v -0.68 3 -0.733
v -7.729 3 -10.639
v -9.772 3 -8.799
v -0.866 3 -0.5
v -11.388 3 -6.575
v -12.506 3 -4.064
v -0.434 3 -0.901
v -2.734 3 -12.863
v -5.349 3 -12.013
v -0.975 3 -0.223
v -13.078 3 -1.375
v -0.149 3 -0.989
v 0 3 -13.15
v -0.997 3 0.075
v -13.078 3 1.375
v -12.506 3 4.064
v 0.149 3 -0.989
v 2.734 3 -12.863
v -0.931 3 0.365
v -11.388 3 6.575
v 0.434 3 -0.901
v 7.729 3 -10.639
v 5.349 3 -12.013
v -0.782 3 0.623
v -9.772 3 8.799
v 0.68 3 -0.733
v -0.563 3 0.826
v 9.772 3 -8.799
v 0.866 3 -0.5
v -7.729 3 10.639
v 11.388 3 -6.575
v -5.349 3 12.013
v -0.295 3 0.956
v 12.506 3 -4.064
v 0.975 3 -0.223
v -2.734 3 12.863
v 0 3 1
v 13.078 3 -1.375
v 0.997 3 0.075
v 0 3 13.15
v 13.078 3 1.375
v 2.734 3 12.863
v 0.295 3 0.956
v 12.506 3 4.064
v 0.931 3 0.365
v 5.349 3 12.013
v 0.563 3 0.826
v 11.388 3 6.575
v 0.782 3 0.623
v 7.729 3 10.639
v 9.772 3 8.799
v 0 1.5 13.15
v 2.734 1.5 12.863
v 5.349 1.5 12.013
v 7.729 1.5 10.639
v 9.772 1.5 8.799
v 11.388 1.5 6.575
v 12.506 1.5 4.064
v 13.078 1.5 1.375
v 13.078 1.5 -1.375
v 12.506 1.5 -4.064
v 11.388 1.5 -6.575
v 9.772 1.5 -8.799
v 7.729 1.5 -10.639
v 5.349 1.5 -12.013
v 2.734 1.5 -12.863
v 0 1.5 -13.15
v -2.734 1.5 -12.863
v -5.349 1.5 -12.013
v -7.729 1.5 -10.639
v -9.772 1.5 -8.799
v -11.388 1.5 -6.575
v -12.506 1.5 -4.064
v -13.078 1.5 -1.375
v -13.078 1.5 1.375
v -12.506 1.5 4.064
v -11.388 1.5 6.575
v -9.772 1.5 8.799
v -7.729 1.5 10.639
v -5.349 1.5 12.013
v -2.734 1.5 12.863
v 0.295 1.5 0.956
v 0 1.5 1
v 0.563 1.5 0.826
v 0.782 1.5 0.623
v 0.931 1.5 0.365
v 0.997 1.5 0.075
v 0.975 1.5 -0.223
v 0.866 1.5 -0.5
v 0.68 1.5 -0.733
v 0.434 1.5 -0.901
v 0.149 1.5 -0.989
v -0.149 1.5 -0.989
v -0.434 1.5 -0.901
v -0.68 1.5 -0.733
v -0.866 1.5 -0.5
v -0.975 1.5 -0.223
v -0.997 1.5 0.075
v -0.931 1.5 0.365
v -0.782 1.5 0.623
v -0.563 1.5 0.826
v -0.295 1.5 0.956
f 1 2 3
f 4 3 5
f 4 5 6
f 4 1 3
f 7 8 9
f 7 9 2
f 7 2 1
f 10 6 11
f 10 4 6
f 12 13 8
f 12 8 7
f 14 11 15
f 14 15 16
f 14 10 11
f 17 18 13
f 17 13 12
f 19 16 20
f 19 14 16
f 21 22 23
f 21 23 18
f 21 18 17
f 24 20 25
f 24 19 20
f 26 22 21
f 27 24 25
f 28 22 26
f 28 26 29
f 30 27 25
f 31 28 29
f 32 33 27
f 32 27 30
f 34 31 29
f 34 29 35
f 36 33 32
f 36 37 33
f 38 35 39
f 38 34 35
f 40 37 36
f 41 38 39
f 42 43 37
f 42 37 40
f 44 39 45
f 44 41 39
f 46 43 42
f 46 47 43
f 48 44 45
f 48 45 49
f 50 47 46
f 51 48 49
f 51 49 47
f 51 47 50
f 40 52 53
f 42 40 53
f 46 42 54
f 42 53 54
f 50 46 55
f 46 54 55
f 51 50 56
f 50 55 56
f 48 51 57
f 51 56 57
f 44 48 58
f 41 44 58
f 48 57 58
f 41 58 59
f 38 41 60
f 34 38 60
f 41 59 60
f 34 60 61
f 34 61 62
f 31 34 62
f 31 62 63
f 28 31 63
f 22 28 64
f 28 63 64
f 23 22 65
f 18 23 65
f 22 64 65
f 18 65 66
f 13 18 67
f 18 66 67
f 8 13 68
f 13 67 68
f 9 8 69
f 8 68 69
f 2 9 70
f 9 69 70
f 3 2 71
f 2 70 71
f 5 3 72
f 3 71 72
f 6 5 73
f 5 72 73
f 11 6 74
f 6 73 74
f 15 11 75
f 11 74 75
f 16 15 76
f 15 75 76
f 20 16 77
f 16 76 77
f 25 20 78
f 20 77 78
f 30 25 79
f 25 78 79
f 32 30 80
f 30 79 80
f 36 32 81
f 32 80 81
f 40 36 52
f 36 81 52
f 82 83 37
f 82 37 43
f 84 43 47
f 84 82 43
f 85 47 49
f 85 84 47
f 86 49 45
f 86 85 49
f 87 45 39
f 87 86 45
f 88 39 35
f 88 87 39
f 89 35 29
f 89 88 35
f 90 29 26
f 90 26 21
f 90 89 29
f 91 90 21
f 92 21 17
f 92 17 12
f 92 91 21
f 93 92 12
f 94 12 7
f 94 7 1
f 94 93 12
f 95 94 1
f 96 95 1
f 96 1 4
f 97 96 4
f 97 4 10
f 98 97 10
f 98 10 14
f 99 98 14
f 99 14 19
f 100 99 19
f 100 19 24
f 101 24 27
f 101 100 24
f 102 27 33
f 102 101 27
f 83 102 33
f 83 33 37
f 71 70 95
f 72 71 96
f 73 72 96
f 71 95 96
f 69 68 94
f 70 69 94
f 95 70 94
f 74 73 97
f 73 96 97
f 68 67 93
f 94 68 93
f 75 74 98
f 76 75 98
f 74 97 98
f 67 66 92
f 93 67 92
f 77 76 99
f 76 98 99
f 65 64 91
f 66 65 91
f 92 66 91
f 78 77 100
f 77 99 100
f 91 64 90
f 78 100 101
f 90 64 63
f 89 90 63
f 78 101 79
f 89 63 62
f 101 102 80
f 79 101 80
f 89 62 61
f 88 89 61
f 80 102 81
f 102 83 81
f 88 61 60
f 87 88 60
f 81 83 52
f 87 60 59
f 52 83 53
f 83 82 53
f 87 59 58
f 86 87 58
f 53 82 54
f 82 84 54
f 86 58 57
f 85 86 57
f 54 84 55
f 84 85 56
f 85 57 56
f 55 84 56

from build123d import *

# Parameters (mm, degrees)
SKETCH1_R           = 10.5
SKETCH1_R_2         = 1
BOSS_EXTRUDE1_DEPTH = 1.5
SKETCH2_R           = 13.15
SKETCH2_R_2         = 10.5
SKETCH2_R_3         = 1
BOSS_EXTRUDE2_DEPTH = 1.5
SKETCH4_R           = 10.5
CUT_EXTRUDE1_DEPTH  = 1.5


with BuildPart() as part:
    # Sketch1 → Boss-Extrude1 (new body)
    with BuildSketch(Plane(origin=(0, 0, 0), x_dir=(1, 0, 0), z_dir=(0, 1, 0))):
        with Locations(Location((0, 0, 0), (0, 0, 270))):
            Circle(SKETCH1_R)
        with Locations(Location((0, 0, 0), (0, 0, 270))):
            Circle(SKETCH1_R_2, mode=Mode.SUBTRACT)
    extrude(amount=BOSS_EXTRUDE1_DEPTH)

    # Sketch2 → Boss-Extrude2 (add)
    with BuildSketch(Plane(origin=(0, 1.5, 0), x_dir=(1, 0, 0), z_dir=(0, 1, 0))):
        with Locations(Location((0, 0, 0), (0, 0, 270))):
            Circle(SKETCH2_R)
        with Locations(Location((0, 0, 0), (0, 0, 270))):
            Circle(SKETCH2_R_2, mode=Mode.SUBTRACT)
        with Locations(Location((0, 0, 0), (0, 0, 270))):
            Circle(SKETCH2_R_2)
        with Locations(Location((0, 0, 0), (0, 0, 270))):
            Circle(SKETCH2_R_3, mode=Mode.SUBTRACT)
    extrude(amount=BOSS_EXTRUDE2_DEPTH)

    # Sketch4 → Cut-Extrude1 (cut)
    with BuildSketch(Plane.XZ):
        Circle(SKETCH4_R)
    extrude(amount=-CUT_EXTRUDE1_DEPTH, mode=Mode.SUBTRACT)


solid = part.part
